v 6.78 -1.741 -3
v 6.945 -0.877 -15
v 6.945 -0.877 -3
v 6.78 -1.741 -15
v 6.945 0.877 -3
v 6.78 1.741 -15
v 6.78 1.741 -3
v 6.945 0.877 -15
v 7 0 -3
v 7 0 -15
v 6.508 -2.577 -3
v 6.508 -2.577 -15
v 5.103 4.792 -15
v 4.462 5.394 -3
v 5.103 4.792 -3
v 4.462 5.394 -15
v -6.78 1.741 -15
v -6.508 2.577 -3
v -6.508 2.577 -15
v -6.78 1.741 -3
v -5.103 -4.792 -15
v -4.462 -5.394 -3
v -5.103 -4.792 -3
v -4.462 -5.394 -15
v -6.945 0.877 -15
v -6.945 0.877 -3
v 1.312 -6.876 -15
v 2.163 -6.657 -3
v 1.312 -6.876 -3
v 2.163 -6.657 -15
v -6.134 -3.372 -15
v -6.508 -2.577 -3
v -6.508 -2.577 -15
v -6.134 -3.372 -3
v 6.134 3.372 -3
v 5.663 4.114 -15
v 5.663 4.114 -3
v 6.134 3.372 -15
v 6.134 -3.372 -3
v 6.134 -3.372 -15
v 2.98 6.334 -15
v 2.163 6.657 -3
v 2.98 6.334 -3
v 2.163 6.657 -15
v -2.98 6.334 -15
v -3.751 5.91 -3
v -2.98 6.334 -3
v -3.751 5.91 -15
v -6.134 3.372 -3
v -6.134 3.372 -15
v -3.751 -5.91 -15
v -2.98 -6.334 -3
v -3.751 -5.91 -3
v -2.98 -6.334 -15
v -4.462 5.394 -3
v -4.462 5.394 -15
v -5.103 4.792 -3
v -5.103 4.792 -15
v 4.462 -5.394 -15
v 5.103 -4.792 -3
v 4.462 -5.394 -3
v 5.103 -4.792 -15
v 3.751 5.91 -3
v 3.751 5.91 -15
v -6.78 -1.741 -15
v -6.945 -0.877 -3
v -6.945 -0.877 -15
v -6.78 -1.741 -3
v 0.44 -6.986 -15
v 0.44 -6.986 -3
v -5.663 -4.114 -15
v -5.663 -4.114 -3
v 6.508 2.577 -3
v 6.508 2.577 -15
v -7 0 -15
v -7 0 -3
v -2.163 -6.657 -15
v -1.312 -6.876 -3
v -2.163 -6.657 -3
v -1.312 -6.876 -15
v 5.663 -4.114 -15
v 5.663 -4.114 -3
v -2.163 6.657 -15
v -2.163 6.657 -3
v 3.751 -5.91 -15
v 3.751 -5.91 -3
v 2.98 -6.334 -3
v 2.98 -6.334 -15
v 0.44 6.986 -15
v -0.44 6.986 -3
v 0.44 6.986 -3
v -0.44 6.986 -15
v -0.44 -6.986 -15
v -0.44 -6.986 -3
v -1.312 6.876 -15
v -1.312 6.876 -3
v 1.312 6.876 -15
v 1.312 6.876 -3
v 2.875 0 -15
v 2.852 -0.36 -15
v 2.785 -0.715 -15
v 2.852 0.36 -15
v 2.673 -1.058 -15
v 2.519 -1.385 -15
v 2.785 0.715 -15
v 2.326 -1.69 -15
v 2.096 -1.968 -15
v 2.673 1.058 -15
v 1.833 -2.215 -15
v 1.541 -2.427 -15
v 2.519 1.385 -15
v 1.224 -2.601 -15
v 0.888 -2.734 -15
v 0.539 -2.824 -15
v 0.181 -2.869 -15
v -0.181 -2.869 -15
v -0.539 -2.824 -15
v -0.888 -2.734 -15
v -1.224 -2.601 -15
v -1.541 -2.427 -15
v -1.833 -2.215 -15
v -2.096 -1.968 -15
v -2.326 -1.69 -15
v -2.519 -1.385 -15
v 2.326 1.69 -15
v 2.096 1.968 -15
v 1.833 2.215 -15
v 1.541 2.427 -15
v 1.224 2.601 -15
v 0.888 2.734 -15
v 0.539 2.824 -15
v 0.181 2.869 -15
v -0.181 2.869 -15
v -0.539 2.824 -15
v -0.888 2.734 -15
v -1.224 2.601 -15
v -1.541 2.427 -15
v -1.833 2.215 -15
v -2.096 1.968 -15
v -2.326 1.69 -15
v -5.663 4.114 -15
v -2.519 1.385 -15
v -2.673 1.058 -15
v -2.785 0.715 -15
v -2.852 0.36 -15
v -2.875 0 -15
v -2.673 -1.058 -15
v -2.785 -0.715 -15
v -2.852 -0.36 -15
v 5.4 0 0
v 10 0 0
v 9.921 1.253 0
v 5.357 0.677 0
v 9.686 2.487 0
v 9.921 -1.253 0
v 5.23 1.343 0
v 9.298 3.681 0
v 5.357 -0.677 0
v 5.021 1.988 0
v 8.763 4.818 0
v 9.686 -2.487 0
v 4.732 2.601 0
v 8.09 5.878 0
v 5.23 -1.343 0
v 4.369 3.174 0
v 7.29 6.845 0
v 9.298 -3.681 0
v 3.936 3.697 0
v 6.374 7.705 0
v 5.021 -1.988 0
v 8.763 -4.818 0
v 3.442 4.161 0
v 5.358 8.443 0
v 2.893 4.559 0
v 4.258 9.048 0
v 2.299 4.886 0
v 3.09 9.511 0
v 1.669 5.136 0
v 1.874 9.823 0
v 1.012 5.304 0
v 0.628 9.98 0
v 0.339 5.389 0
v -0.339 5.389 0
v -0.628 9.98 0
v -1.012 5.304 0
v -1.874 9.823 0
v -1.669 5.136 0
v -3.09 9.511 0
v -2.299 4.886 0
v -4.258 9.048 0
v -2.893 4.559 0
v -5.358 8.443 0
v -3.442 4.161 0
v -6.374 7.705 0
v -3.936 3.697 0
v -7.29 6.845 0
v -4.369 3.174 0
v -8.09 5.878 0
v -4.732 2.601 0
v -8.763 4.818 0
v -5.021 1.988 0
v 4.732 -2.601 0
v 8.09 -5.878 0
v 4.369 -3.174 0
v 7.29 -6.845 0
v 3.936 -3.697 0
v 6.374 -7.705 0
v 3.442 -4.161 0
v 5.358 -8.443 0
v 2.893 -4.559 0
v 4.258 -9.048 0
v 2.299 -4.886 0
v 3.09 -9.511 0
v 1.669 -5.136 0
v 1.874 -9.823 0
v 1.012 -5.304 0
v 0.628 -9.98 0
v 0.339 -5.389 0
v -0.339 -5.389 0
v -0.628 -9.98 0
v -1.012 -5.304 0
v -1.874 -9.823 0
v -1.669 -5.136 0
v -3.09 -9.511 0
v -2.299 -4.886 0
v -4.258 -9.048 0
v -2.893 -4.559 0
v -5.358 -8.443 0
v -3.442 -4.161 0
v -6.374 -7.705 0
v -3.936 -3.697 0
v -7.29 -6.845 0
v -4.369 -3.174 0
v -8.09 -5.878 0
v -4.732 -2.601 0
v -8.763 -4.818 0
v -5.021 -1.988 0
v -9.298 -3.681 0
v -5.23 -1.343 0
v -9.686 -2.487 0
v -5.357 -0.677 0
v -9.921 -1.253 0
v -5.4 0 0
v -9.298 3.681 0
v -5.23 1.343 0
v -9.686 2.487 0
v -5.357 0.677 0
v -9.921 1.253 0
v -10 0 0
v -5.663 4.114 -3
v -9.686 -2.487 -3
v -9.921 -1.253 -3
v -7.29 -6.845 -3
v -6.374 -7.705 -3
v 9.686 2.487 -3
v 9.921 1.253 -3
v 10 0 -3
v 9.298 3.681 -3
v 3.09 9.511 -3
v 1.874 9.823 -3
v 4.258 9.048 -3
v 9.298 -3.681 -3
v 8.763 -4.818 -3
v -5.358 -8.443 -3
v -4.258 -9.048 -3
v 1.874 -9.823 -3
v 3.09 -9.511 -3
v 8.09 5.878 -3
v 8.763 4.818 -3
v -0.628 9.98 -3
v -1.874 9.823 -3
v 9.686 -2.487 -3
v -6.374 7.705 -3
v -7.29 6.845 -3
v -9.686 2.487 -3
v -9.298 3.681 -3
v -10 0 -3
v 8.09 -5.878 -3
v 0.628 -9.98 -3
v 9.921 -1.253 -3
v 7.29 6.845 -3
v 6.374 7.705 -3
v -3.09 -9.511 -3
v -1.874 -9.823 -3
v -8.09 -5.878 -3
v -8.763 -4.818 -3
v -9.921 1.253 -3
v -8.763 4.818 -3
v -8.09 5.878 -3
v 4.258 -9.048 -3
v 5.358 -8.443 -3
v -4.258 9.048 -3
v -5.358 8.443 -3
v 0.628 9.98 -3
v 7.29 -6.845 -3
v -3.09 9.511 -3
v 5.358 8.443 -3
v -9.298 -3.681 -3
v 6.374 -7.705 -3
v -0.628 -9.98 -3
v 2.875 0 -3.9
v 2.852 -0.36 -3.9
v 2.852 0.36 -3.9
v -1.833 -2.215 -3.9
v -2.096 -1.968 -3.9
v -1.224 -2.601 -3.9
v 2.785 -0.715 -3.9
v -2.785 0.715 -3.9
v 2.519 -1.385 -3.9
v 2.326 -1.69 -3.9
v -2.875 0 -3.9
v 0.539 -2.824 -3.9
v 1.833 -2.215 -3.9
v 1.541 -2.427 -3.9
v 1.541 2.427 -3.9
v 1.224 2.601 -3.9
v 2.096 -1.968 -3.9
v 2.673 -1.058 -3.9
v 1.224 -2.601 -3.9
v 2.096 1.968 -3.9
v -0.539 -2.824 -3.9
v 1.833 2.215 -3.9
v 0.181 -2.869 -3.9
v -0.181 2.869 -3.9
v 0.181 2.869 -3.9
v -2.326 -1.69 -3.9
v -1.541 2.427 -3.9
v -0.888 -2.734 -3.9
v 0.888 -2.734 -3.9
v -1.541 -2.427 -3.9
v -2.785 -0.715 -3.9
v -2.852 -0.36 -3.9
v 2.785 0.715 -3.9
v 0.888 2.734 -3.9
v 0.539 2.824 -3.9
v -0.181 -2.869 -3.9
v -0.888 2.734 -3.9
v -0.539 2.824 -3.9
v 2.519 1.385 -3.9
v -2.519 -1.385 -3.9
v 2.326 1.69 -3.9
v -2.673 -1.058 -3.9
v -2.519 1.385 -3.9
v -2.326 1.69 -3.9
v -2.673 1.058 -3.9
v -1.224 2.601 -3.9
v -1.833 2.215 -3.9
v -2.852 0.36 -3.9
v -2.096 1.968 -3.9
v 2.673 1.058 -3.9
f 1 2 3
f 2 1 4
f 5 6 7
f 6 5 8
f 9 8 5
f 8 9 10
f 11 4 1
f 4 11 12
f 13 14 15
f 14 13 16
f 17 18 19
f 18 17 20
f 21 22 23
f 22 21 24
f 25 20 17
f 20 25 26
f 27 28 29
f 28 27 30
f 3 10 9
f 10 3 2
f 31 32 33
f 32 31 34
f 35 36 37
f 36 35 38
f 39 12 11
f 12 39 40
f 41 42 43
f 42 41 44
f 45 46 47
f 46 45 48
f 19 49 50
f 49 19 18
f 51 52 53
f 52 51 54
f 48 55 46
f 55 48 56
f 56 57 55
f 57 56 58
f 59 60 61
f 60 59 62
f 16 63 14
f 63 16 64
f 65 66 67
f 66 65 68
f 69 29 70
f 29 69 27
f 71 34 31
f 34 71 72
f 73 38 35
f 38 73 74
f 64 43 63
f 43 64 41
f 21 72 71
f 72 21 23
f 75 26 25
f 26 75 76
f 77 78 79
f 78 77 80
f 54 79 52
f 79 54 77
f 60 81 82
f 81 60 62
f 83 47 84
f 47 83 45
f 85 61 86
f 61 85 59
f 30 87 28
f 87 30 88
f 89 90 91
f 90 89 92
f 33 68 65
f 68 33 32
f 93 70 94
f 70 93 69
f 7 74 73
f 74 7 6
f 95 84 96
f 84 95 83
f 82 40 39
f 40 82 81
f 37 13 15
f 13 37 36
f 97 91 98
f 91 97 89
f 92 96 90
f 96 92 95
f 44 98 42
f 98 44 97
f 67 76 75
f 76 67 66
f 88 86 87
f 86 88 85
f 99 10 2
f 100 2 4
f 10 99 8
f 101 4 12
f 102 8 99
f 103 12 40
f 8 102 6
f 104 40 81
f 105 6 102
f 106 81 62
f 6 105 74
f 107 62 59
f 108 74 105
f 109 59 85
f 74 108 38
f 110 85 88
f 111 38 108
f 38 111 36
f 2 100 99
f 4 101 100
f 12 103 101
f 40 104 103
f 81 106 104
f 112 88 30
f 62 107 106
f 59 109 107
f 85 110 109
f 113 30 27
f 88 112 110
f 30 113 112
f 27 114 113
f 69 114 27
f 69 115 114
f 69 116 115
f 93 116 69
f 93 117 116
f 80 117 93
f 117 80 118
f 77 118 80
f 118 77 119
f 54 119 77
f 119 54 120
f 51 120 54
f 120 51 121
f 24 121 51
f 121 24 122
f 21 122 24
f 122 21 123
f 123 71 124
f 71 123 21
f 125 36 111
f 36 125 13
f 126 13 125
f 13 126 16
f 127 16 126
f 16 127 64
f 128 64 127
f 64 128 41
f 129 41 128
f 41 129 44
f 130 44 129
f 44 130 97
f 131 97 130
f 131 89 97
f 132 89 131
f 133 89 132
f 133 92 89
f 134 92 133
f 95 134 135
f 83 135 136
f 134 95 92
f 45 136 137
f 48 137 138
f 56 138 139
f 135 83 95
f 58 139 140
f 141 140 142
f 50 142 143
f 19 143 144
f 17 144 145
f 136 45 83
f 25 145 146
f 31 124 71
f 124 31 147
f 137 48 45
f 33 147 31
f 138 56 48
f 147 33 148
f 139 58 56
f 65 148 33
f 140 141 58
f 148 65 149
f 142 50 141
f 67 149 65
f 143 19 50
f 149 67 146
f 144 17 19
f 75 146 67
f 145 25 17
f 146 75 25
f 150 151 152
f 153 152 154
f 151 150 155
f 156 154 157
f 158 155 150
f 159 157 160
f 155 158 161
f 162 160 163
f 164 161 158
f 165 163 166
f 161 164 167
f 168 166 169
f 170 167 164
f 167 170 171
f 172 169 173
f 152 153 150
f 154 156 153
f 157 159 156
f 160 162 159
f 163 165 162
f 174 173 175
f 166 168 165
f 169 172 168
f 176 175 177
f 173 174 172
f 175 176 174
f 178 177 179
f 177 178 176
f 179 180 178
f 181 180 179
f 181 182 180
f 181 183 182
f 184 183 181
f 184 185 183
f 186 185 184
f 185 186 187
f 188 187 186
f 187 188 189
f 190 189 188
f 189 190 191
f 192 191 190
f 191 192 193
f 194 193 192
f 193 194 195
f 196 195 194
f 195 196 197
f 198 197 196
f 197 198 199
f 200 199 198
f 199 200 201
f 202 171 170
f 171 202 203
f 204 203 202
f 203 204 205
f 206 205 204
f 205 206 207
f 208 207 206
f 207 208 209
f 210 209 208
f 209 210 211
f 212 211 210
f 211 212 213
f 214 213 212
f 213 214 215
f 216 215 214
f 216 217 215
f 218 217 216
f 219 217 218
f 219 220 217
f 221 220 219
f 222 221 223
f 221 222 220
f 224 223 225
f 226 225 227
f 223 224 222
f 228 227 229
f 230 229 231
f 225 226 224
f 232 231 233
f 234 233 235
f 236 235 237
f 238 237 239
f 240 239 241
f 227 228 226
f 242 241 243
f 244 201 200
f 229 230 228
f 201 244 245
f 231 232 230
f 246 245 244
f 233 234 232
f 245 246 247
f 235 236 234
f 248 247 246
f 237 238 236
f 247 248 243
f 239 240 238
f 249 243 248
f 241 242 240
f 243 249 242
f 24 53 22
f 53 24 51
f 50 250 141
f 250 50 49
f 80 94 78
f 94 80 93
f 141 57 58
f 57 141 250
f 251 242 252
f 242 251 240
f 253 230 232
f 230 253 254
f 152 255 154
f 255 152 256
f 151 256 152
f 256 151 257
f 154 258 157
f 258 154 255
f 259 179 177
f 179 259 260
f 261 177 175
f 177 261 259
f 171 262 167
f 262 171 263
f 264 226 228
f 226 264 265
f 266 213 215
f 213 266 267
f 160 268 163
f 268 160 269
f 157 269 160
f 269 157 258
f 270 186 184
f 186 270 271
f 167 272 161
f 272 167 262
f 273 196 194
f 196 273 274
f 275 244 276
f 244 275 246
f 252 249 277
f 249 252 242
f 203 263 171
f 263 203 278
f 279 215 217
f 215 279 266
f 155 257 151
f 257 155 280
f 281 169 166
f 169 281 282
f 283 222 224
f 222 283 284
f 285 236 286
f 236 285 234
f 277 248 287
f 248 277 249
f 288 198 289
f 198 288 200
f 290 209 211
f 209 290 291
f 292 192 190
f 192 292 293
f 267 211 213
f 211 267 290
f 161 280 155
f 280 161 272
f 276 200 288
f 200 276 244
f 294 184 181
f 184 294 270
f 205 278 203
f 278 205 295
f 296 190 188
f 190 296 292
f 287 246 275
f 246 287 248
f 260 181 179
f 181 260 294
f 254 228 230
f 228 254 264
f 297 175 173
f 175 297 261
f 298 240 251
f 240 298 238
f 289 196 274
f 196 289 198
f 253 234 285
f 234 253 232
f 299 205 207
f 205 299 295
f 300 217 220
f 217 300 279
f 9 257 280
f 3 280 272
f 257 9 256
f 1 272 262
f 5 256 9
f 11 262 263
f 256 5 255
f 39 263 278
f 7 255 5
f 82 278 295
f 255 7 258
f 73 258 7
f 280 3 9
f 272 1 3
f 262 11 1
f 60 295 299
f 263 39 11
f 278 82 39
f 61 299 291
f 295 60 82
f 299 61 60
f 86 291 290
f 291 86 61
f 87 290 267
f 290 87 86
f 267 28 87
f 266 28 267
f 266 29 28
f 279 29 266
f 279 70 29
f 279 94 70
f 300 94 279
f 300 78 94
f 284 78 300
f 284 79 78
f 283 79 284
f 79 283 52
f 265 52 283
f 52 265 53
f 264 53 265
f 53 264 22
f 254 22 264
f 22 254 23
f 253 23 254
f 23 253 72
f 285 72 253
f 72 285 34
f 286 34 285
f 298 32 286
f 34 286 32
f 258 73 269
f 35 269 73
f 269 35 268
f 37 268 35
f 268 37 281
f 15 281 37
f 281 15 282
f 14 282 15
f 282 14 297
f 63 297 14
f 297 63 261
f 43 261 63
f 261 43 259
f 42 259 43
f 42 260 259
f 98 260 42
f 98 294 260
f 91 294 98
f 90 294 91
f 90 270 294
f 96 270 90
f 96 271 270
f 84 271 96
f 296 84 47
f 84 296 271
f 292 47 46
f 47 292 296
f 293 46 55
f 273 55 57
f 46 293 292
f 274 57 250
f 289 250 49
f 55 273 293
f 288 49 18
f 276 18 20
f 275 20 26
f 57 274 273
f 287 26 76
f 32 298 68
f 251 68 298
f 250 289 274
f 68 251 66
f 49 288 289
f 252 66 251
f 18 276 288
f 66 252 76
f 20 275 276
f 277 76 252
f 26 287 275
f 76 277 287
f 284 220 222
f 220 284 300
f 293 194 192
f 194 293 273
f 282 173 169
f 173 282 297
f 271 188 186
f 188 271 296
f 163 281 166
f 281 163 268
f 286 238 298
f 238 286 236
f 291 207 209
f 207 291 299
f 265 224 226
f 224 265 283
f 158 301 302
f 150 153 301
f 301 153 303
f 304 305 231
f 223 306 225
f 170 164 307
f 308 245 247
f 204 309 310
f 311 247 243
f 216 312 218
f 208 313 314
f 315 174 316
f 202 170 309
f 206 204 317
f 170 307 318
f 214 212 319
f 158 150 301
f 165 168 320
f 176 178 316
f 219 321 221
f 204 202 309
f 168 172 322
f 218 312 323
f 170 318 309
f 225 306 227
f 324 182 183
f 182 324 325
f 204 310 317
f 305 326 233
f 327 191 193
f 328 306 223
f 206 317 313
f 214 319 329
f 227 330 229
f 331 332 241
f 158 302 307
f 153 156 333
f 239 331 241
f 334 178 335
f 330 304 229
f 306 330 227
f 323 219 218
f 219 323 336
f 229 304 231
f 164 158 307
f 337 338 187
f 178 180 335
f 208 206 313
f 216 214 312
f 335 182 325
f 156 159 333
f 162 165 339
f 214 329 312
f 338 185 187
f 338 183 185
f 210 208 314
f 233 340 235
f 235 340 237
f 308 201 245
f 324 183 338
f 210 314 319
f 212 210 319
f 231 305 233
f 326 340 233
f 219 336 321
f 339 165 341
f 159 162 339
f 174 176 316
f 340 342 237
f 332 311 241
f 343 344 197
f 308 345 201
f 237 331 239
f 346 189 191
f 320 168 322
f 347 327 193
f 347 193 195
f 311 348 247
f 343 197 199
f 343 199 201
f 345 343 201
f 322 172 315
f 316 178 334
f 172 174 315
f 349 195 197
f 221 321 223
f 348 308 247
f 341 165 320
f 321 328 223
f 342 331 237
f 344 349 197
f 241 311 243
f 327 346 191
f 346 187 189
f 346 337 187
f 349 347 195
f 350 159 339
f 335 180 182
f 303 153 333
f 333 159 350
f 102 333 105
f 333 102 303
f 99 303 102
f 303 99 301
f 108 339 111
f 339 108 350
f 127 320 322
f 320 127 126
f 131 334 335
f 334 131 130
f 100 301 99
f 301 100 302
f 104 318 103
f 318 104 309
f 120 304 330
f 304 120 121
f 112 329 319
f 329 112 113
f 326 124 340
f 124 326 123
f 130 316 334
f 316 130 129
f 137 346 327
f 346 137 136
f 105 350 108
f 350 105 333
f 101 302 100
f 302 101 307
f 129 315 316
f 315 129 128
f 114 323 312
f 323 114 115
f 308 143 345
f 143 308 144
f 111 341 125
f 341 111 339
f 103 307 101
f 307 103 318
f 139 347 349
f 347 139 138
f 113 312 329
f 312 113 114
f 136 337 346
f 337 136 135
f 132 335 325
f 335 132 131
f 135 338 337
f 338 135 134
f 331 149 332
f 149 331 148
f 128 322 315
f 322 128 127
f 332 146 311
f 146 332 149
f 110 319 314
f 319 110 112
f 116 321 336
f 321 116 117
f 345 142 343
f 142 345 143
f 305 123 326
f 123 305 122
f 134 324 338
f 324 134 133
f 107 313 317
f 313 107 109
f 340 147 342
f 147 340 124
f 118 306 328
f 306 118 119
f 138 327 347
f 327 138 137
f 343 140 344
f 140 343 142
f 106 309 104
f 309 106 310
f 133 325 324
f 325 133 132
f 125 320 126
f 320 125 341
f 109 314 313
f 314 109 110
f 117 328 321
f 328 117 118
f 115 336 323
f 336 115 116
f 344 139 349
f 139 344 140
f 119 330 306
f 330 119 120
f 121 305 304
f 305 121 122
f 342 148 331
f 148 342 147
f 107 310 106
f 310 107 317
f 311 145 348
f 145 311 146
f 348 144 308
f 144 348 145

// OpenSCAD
$fn = 50;


difference() {
	union() {
		translate(v = [0, 0, -15.0000000000]) {
			cylinder(h = 15, r = 7.0000000000);
		}
		translate(v = [0, 0, -3.0000000000]) {
			cylinder(h = 3, r = 10.0000000000);
		}
	}
	union() {
		translate(v = [0, 0, 0]) {
			rotate(a = [0, 0, 0]) {
				difference() {
					union() {
						#translate(v = [0, 0, -15.0000000000]) {
							cylinder(h = 15, r = 2.6000000000);
						}
						#translate(v = [0, 0, -3.9000000000]) {
							cylinder(h = 3.9000000000, r1 = 2.8750000000, r2 = 5.4000000000);
						}
						#translate(v = [0, 0, -15.0000000000]) {
							cylinder(h = 15, r = 2.8750000000);
						}
						#translate(v = [0, 0, -15.0000000000]) {
							cylinder(h = 15, r = 2.6000000000);
						}
					}
					union();
				}
			}
		}
	}
}
